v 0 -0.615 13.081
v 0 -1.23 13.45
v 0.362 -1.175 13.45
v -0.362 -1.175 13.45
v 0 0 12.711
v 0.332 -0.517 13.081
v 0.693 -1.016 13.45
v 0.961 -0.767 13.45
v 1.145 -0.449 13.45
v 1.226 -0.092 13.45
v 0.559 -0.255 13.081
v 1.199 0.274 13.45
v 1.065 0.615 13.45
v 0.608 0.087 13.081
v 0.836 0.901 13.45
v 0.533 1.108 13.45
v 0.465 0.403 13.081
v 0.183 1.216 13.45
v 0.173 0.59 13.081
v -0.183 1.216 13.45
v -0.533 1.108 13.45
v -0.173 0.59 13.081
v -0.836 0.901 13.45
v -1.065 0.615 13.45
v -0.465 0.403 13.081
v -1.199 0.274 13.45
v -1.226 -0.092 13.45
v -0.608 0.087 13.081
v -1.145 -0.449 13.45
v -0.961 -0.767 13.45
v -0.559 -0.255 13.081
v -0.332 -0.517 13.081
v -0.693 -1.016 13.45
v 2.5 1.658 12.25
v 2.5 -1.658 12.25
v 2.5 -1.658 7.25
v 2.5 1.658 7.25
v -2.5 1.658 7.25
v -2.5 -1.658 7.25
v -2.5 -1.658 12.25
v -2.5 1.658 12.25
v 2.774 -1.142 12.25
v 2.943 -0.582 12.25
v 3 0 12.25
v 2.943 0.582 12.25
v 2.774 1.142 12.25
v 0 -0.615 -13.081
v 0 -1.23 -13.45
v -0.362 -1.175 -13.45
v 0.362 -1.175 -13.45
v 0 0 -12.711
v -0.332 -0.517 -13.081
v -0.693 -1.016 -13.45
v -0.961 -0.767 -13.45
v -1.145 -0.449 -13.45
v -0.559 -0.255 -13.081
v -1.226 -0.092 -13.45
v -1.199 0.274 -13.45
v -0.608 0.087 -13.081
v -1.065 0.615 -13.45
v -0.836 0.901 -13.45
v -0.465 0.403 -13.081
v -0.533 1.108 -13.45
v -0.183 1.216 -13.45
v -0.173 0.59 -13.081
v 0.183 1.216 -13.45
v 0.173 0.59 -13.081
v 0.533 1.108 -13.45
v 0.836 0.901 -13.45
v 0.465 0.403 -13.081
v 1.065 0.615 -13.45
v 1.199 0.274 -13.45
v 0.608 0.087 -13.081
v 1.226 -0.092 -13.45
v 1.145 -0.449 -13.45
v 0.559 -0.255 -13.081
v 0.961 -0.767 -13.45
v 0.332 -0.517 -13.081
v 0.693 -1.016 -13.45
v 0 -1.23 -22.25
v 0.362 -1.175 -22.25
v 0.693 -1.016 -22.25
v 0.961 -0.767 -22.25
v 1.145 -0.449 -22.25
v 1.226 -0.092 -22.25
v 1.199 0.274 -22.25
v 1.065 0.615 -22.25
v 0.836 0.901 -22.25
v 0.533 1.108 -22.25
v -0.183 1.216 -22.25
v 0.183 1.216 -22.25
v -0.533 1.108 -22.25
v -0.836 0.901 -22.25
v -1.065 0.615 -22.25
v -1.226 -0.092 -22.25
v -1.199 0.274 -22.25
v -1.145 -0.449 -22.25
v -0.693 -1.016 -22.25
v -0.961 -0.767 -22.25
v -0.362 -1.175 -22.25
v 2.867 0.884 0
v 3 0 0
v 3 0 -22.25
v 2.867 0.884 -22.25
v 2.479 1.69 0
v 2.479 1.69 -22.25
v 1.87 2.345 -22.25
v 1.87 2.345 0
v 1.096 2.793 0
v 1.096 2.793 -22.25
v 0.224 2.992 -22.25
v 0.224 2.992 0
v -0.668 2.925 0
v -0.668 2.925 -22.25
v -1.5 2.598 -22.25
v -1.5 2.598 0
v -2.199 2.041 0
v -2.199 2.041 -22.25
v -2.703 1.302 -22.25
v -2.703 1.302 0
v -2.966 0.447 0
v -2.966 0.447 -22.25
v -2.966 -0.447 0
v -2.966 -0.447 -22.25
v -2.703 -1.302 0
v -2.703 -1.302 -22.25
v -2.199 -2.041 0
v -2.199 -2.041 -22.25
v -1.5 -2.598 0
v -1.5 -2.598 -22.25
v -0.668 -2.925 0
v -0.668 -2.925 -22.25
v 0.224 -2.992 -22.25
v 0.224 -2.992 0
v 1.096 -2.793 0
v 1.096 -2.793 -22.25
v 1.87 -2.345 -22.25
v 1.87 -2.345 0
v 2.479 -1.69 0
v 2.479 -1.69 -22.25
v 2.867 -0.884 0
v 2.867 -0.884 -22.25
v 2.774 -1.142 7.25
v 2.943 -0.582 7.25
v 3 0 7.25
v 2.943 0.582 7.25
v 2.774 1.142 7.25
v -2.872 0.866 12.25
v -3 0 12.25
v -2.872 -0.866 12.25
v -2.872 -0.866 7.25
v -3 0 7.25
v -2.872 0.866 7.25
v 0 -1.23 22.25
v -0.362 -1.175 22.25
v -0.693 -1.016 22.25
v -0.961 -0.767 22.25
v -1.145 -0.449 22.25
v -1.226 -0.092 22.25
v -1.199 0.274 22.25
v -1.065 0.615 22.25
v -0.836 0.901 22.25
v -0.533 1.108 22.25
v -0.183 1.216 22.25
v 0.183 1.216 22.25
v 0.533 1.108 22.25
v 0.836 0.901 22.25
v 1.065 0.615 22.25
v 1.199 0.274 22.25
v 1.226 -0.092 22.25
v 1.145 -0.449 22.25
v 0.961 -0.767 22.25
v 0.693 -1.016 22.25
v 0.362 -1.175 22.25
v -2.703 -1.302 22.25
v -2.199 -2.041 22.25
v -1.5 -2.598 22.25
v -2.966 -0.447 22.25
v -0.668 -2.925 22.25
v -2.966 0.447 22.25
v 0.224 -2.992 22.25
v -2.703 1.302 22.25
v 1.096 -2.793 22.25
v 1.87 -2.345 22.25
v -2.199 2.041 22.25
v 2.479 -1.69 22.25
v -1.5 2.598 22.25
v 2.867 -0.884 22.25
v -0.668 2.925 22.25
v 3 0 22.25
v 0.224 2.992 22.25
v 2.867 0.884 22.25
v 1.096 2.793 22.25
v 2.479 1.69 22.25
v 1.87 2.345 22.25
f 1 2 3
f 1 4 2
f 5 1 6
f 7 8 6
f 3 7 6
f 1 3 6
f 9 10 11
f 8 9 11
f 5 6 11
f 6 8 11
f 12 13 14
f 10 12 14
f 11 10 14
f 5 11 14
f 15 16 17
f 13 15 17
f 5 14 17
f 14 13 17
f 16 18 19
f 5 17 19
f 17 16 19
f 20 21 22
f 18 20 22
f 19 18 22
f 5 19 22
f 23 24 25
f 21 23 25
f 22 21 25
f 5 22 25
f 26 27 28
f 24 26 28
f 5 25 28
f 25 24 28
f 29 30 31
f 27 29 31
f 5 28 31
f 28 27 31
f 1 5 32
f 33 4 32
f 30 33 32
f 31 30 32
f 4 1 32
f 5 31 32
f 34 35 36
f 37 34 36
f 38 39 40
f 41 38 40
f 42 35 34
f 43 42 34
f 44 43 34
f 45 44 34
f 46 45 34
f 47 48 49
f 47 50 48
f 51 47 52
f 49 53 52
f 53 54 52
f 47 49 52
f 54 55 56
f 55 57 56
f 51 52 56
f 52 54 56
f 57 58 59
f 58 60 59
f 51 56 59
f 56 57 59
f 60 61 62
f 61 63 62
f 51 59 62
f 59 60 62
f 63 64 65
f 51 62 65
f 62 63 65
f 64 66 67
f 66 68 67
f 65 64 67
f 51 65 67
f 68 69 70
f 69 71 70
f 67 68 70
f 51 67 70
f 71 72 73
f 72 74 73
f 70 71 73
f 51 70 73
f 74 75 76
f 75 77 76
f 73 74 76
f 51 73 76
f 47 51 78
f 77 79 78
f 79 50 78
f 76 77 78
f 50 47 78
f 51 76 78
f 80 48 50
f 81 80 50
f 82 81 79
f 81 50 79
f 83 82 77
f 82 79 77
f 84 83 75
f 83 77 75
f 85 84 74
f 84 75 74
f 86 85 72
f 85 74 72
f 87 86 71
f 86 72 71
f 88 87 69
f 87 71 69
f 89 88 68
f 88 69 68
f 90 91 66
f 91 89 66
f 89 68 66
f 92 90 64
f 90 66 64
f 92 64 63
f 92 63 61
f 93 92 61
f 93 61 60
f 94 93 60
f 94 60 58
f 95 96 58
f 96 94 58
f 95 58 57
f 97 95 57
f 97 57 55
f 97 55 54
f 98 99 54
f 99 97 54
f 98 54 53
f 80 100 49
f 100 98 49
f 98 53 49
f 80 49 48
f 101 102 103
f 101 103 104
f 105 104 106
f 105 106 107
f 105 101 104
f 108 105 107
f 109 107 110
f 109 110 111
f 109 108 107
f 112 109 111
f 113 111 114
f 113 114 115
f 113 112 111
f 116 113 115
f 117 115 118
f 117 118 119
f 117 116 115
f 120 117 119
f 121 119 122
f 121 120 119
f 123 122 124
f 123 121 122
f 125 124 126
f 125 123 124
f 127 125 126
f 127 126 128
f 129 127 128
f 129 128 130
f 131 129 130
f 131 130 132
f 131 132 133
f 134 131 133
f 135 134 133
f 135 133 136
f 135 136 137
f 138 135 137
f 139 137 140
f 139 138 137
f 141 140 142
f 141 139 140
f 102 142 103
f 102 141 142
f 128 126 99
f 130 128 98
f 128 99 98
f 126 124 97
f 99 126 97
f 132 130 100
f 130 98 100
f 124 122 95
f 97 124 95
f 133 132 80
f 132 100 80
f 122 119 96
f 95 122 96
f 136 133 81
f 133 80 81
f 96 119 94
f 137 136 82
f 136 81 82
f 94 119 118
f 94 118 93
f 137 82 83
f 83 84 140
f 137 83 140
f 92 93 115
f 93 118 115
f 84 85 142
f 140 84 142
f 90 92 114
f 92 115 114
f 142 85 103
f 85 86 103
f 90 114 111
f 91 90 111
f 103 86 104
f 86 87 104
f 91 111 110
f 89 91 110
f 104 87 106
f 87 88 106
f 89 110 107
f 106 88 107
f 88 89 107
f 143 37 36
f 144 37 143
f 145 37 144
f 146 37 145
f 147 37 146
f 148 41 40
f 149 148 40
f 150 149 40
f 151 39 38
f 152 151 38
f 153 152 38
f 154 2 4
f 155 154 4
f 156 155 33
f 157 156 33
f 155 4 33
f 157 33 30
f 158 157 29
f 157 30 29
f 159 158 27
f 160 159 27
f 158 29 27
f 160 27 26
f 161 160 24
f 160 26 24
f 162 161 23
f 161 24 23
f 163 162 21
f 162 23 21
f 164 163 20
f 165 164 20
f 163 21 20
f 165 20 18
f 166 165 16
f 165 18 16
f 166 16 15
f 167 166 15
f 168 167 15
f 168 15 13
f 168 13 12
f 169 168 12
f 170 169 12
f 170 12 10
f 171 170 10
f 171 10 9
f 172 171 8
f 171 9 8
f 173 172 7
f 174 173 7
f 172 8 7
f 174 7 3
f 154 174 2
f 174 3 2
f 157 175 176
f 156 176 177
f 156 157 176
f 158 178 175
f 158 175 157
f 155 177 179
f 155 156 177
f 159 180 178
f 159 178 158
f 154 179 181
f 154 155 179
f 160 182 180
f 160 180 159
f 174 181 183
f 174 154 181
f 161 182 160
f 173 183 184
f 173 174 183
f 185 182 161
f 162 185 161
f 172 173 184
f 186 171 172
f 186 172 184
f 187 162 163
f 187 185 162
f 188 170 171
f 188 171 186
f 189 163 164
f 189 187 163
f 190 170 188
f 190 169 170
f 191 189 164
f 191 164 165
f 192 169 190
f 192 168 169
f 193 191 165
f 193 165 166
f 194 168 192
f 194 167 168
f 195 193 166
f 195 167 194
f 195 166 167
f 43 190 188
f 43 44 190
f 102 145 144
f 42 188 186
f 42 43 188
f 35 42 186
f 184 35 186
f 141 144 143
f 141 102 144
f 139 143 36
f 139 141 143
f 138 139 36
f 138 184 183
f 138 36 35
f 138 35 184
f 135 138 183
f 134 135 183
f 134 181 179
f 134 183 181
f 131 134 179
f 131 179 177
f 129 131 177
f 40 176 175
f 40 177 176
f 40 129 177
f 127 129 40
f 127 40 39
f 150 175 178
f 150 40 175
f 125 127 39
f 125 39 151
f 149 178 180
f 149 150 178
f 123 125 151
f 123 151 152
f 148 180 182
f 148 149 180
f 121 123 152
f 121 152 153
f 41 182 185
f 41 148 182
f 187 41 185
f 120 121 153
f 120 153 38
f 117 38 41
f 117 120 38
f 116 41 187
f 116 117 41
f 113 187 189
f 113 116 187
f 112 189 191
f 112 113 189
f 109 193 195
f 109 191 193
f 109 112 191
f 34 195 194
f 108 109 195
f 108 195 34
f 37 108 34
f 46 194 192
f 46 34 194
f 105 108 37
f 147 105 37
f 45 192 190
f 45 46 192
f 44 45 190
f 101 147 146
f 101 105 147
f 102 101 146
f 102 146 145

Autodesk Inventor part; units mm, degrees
ref_plane "YZ Plane" through (0, 0, 0) normal (1, 0, 0) x (0, 1, 0)
ref_plane "XZ Plane" through (0, 0, 0) normal (0, 1, 0) x (-1, 0, 0)
ref_plane "XY Plane" through (0, 0, 0) normal (0, 0, 1) x (1, 0, 0)
sketch "Sketch1" plane through (0, 0, 0) normal (0, 0, 1) x (1, 0, 0)
  circle A0 centre (0, 0) radius 3
  dimension "d0" = 6
extrude "Extrusion1" add sketch "Sketch1" along normal mid plane 44.5
sketch "Sketch2" plane through (0, 0, 22.25) normal (0, 0, 1) x (1, 0, 0)
  point P0 (0, 0)
  point P1 (0, 0)
hole "Hole1" at (0, 0, 22.25) direction (0, 0, -1) diameter 2.459 depth 8.8 tip angle 118 thread size "M3x0.5" class "6H" standard "ANSI Metric M Profile"
sketch "Sketch3" plane through (0, 0, 0) normal (0, 1, 0) x (-1, 0, 0)
  line L0 (3, 7.25) -> (2.5, 7.25)
  line L1 (2.5, 7.25) -> (2.5, 12.25)
  line L2 (2.5, 12.25) -> (3, 12.25)
  line L3 (3, 12.25) -> (3, 7.25)
  line L4 (-3, 12.25) -> (-2.5, 12.25)
  line L5 (-2.5, 12.25) -> (-2.5, 7.25)
  line L6 (-2.5, 7.25) -> (-3, 7.25)
  line L7 (-3, 7.25) -> (-3, 12.25)
  line L8 (-3, -22.25) -> (3, -22.25) projected
  line L9 (3, 22.25) -> (-3, 22.25) projected
  point P0 (0, 0)
  point P1 (-3, 23.75)
  dimension "d16" = 0.5
  dimension "d17" = 0.5
  dimension "d18" = 5
  dimension "d19" = 10
extrude "Extrusion2" cut sketch "Sketch3" along normal through all both and the other way through all
mirror "Mirror1" about plane through (0, 0, 0) normal (0, 0, 1) of "Hole1"
equation "\"d17\" = d16"
properties part number "Pancake_Lever Weight" material "Aluminum 6061"
